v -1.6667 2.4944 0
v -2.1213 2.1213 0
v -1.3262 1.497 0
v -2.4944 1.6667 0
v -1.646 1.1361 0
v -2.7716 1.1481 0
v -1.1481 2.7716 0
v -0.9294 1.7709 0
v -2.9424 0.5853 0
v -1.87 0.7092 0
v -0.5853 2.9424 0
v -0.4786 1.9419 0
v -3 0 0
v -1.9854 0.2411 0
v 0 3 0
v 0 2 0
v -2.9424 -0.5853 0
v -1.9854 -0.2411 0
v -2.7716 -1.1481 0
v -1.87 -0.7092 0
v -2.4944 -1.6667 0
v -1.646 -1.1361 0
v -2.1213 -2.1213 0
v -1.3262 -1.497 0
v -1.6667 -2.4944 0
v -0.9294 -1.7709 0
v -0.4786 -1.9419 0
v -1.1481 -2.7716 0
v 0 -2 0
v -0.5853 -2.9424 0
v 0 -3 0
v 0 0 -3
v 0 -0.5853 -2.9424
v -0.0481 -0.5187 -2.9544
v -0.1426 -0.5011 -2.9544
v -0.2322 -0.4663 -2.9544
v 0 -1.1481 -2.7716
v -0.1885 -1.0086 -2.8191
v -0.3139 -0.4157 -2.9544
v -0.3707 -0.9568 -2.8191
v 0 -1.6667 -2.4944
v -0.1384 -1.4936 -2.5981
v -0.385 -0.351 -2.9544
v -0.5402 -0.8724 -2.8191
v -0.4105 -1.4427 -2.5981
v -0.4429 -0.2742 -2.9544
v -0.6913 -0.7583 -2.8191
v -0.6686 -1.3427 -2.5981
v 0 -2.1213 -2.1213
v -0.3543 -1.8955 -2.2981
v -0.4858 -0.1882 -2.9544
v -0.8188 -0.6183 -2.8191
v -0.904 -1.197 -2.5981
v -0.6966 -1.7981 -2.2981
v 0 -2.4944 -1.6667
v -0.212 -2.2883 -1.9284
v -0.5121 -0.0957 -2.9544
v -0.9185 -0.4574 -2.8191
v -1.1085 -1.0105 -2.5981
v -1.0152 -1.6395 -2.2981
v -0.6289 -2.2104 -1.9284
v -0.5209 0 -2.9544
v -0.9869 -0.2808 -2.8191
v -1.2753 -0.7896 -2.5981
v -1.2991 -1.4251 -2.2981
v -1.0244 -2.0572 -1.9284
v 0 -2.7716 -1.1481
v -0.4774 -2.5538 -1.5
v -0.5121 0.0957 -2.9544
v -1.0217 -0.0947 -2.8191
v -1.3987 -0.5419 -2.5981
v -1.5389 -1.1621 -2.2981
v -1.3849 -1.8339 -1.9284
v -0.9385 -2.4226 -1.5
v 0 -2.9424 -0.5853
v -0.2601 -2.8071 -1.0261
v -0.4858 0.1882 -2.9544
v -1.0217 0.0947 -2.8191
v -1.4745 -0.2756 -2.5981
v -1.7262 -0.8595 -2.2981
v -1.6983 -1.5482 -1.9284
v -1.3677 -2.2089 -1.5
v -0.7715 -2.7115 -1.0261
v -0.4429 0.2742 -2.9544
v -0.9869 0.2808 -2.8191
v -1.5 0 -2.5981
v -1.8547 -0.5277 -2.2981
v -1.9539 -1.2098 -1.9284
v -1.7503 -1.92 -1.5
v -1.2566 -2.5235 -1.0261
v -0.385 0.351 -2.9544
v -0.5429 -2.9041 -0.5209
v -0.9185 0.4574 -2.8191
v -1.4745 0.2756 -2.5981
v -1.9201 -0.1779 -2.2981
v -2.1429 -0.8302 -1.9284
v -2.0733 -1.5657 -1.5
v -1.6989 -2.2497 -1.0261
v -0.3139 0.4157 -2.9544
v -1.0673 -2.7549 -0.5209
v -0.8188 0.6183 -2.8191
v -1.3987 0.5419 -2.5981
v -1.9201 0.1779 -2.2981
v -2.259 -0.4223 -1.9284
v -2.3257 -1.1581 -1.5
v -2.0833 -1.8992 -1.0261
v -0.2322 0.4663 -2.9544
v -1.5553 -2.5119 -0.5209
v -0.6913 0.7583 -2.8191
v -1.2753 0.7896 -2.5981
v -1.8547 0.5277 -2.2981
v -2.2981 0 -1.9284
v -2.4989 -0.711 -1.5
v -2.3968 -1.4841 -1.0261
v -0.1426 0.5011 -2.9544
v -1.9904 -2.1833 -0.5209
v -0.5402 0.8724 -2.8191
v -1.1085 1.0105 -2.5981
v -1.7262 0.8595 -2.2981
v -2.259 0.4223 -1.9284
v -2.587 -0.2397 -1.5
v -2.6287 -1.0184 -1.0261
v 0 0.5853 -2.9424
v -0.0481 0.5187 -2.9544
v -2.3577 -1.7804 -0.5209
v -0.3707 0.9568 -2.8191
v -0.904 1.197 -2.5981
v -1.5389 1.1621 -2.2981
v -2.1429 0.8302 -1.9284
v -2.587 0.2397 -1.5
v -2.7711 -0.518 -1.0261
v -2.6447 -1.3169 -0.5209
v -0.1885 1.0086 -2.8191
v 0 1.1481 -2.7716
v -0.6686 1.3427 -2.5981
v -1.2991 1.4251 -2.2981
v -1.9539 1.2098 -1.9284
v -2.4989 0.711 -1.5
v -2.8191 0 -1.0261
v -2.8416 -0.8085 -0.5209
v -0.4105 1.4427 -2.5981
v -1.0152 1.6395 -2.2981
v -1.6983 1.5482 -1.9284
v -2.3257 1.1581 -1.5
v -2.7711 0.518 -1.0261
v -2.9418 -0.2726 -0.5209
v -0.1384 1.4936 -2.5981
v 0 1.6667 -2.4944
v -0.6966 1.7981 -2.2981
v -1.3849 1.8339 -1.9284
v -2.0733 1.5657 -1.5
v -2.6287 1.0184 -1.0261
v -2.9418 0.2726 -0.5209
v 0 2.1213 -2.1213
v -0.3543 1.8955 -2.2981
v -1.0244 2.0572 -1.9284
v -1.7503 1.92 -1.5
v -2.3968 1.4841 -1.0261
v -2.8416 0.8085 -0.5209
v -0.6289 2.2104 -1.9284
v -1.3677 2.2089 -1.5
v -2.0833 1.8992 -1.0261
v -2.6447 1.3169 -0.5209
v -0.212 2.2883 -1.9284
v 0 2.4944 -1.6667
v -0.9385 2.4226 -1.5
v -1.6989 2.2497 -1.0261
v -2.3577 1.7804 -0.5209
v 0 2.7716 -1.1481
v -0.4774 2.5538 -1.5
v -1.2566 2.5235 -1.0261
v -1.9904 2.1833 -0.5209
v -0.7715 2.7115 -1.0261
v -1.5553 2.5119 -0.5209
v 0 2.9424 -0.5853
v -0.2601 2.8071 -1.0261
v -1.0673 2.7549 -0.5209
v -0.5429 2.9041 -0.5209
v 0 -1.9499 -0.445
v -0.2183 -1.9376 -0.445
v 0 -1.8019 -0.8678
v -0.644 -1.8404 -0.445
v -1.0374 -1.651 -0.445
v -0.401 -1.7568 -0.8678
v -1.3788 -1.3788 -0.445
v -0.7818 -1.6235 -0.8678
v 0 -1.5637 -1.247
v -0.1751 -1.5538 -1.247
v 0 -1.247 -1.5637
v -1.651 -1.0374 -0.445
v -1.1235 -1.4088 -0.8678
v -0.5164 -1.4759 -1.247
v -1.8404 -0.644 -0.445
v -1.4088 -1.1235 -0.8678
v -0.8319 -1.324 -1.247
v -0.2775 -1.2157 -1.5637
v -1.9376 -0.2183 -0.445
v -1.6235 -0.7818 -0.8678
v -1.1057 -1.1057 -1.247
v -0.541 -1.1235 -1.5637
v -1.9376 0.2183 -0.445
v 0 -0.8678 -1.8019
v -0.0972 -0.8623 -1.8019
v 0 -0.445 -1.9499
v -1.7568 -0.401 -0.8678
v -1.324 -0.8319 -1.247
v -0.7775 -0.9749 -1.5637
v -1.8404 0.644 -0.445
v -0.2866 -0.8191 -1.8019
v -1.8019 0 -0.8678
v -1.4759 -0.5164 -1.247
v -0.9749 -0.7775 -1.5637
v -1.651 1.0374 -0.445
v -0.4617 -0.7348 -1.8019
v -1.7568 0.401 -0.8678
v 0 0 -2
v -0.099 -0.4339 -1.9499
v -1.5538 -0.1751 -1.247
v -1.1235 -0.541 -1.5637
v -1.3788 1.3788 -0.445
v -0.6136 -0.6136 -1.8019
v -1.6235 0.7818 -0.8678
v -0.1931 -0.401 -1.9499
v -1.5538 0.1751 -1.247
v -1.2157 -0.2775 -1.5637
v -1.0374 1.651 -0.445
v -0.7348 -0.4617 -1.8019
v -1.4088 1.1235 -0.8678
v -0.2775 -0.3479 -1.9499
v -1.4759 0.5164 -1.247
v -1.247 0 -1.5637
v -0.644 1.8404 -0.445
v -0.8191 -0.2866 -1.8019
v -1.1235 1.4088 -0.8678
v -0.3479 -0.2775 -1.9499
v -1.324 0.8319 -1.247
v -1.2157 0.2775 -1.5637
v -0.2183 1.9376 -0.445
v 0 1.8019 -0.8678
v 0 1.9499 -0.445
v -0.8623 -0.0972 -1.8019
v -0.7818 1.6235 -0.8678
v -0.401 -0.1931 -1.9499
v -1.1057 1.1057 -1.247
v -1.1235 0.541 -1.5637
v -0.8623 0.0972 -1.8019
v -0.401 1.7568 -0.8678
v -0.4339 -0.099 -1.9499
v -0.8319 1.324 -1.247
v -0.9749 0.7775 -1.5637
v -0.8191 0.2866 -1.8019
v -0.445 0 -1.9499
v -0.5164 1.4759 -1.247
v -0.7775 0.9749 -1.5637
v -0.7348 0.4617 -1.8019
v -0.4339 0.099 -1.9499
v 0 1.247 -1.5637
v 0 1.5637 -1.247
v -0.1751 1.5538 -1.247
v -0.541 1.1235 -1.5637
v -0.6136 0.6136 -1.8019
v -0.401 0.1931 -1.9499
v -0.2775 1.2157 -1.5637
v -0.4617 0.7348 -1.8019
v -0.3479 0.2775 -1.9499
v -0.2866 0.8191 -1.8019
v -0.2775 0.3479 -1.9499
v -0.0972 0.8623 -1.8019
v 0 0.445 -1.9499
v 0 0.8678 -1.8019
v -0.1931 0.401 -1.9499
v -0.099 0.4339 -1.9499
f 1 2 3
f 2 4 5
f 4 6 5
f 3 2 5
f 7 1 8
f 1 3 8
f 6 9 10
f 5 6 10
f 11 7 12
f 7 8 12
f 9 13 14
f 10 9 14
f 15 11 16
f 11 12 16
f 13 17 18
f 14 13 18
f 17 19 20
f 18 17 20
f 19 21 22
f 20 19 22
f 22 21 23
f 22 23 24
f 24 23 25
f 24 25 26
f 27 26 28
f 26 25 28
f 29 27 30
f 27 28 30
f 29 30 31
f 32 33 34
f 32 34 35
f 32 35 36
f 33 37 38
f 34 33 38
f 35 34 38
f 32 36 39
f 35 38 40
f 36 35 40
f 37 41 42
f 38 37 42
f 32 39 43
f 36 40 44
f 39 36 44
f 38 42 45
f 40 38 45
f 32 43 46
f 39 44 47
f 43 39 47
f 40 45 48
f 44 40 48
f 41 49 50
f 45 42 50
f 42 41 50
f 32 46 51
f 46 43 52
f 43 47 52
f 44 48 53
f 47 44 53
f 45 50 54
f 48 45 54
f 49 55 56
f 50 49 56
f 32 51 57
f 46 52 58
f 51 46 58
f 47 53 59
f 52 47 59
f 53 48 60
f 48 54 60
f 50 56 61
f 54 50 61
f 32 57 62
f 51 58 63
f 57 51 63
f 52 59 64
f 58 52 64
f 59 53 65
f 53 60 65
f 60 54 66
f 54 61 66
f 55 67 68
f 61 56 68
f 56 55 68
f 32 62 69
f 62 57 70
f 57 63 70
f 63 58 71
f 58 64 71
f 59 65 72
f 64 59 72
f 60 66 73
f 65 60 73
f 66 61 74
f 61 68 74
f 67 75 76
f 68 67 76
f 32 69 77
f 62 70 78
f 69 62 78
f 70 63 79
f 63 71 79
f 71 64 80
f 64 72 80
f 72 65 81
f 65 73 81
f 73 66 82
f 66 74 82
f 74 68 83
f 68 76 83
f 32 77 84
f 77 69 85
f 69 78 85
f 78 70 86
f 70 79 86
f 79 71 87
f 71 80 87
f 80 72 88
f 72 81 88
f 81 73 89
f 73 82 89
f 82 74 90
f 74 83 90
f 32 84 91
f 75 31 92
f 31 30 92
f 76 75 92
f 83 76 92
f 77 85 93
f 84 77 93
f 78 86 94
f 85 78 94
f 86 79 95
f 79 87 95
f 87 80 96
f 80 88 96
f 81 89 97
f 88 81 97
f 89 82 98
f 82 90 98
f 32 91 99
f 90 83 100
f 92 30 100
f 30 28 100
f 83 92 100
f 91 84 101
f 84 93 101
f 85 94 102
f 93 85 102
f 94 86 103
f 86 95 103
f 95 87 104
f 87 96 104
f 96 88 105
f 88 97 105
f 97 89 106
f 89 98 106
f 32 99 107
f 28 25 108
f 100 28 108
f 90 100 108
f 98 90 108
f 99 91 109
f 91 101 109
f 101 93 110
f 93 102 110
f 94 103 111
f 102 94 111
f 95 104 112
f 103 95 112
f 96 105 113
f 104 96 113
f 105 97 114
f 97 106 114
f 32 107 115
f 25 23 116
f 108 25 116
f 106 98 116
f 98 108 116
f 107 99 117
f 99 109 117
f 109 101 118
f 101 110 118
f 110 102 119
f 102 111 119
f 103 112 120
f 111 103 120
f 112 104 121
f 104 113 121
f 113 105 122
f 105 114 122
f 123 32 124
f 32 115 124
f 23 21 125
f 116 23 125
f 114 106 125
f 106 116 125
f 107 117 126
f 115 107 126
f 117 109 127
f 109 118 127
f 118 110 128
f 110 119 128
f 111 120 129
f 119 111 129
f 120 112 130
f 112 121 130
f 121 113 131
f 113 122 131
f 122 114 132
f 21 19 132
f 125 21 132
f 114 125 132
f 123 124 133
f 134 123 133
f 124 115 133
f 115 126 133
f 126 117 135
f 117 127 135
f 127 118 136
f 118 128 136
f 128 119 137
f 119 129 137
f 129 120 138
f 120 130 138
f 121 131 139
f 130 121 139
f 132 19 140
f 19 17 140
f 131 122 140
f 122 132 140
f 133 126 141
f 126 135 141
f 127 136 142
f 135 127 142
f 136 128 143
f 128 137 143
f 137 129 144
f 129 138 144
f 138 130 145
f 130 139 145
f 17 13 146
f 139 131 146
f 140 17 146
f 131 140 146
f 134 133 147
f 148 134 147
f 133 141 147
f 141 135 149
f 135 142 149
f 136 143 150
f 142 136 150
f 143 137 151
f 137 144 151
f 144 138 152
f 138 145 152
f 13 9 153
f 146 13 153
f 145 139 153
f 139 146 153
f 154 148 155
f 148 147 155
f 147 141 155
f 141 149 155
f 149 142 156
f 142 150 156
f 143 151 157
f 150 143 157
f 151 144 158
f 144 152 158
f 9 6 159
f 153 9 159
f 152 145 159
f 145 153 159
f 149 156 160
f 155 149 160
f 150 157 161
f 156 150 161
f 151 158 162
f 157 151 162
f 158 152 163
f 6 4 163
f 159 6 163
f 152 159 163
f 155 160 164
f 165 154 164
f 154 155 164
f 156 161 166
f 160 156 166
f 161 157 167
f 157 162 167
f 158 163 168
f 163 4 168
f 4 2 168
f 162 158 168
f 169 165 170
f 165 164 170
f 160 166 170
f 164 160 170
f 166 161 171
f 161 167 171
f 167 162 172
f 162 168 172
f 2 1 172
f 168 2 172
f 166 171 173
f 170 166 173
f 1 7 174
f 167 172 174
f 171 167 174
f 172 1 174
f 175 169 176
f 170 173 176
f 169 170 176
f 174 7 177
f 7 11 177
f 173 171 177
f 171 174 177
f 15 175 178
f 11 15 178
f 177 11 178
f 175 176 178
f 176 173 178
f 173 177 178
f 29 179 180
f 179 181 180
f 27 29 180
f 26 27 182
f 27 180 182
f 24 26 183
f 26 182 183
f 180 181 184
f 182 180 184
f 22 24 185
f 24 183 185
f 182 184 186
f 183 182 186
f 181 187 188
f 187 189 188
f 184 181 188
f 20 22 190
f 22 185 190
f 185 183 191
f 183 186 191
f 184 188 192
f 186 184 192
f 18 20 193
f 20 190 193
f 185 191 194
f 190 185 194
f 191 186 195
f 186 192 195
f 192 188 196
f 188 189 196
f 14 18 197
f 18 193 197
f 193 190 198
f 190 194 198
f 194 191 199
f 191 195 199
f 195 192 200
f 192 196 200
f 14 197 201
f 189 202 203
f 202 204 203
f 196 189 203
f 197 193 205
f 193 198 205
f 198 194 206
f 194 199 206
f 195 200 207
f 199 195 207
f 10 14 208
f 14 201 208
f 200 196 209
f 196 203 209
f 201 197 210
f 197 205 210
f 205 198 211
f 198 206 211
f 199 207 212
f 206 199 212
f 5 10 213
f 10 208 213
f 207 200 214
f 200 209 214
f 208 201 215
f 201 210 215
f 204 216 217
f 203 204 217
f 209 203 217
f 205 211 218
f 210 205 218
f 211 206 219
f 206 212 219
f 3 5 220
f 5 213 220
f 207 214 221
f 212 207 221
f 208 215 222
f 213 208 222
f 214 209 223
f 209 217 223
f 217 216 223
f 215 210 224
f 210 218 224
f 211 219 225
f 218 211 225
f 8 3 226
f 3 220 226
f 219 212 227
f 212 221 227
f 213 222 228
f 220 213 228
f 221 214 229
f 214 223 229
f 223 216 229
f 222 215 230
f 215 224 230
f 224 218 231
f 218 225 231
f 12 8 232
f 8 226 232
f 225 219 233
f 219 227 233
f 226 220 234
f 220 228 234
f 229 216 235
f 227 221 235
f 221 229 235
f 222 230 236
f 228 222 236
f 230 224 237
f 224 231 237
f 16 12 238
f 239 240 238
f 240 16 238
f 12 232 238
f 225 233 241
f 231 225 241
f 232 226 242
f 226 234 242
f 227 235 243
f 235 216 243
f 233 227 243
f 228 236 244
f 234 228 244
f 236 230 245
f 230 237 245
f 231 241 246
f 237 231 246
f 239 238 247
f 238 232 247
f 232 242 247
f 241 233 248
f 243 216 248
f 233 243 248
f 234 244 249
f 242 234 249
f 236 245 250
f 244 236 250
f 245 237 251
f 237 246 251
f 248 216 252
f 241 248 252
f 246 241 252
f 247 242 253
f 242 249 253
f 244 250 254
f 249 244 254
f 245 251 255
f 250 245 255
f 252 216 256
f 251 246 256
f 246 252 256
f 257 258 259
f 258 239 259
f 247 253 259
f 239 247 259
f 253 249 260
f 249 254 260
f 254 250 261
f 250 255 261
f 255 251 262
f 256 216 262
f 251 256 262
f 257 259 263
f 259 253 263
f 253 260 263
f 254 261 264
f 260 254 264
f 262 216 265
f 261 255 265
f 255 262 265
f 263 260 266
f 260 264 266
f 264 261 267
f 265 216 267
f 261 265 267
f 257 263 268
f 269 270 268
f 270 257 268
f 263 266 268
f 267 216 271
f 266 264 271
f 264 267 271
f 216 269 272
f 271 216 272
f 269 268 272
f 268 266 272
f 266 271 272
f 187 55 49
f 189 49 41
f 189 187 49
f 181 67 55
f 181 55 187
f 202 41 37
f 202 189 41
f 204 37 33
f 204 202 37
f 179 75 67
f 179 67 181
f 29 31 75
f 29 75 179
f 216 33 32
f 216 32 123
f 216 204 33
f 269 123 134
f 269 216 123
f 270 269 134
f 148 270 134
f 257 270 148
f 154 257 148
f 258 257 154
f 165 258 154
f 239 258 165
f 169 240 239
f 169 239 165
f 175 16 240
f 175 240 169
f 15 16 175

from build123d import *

# Parameters (mm, degrees)
F2_W     = 11.701234
F2_H     = 3.628718
F3_DEPTH = 12.5
F4_W     = 13.054848
F4_H     = 7.580234
F5_DEPTH = 25


with BuildPart() as f1:
    # F0 (on Front) → F1 (revolve)
    with BuildSketch(Plane.XZ):
        with BuildLine():
            Line((0, -2), (0, -3))
            ThreePointArc((0, -3), (3, 0), (0, 3))
            Line((0, 3), (0, 2))
            ThreePointArc((0, 2), (2, 0), (0, -2))
        make_face()
    revolve(axis=Axis((0, 0, 0), (0, 0, -1)))

    # F2 (on Front) → F3 (cut, symmetric)
    with BuildSketch(Plane.XZ):
        with Locations((0.668144, 1.814359)):
            Rectangle(F2_W, F2_H)
    extrude(amount=F3_DEPTH, both=True, mode=Mode.SUBTRACT)

    # F4 (on Right) → F5 (cut)
    with BuildSketch(Plane.YZ):
        with Locations((0.35008, -1.678151)):
            Rectangle(F4_W, F4_H)
    extrude(amount=F5_DEPTH, mode=Mode.SUBTRACT)


solid = f1.part
